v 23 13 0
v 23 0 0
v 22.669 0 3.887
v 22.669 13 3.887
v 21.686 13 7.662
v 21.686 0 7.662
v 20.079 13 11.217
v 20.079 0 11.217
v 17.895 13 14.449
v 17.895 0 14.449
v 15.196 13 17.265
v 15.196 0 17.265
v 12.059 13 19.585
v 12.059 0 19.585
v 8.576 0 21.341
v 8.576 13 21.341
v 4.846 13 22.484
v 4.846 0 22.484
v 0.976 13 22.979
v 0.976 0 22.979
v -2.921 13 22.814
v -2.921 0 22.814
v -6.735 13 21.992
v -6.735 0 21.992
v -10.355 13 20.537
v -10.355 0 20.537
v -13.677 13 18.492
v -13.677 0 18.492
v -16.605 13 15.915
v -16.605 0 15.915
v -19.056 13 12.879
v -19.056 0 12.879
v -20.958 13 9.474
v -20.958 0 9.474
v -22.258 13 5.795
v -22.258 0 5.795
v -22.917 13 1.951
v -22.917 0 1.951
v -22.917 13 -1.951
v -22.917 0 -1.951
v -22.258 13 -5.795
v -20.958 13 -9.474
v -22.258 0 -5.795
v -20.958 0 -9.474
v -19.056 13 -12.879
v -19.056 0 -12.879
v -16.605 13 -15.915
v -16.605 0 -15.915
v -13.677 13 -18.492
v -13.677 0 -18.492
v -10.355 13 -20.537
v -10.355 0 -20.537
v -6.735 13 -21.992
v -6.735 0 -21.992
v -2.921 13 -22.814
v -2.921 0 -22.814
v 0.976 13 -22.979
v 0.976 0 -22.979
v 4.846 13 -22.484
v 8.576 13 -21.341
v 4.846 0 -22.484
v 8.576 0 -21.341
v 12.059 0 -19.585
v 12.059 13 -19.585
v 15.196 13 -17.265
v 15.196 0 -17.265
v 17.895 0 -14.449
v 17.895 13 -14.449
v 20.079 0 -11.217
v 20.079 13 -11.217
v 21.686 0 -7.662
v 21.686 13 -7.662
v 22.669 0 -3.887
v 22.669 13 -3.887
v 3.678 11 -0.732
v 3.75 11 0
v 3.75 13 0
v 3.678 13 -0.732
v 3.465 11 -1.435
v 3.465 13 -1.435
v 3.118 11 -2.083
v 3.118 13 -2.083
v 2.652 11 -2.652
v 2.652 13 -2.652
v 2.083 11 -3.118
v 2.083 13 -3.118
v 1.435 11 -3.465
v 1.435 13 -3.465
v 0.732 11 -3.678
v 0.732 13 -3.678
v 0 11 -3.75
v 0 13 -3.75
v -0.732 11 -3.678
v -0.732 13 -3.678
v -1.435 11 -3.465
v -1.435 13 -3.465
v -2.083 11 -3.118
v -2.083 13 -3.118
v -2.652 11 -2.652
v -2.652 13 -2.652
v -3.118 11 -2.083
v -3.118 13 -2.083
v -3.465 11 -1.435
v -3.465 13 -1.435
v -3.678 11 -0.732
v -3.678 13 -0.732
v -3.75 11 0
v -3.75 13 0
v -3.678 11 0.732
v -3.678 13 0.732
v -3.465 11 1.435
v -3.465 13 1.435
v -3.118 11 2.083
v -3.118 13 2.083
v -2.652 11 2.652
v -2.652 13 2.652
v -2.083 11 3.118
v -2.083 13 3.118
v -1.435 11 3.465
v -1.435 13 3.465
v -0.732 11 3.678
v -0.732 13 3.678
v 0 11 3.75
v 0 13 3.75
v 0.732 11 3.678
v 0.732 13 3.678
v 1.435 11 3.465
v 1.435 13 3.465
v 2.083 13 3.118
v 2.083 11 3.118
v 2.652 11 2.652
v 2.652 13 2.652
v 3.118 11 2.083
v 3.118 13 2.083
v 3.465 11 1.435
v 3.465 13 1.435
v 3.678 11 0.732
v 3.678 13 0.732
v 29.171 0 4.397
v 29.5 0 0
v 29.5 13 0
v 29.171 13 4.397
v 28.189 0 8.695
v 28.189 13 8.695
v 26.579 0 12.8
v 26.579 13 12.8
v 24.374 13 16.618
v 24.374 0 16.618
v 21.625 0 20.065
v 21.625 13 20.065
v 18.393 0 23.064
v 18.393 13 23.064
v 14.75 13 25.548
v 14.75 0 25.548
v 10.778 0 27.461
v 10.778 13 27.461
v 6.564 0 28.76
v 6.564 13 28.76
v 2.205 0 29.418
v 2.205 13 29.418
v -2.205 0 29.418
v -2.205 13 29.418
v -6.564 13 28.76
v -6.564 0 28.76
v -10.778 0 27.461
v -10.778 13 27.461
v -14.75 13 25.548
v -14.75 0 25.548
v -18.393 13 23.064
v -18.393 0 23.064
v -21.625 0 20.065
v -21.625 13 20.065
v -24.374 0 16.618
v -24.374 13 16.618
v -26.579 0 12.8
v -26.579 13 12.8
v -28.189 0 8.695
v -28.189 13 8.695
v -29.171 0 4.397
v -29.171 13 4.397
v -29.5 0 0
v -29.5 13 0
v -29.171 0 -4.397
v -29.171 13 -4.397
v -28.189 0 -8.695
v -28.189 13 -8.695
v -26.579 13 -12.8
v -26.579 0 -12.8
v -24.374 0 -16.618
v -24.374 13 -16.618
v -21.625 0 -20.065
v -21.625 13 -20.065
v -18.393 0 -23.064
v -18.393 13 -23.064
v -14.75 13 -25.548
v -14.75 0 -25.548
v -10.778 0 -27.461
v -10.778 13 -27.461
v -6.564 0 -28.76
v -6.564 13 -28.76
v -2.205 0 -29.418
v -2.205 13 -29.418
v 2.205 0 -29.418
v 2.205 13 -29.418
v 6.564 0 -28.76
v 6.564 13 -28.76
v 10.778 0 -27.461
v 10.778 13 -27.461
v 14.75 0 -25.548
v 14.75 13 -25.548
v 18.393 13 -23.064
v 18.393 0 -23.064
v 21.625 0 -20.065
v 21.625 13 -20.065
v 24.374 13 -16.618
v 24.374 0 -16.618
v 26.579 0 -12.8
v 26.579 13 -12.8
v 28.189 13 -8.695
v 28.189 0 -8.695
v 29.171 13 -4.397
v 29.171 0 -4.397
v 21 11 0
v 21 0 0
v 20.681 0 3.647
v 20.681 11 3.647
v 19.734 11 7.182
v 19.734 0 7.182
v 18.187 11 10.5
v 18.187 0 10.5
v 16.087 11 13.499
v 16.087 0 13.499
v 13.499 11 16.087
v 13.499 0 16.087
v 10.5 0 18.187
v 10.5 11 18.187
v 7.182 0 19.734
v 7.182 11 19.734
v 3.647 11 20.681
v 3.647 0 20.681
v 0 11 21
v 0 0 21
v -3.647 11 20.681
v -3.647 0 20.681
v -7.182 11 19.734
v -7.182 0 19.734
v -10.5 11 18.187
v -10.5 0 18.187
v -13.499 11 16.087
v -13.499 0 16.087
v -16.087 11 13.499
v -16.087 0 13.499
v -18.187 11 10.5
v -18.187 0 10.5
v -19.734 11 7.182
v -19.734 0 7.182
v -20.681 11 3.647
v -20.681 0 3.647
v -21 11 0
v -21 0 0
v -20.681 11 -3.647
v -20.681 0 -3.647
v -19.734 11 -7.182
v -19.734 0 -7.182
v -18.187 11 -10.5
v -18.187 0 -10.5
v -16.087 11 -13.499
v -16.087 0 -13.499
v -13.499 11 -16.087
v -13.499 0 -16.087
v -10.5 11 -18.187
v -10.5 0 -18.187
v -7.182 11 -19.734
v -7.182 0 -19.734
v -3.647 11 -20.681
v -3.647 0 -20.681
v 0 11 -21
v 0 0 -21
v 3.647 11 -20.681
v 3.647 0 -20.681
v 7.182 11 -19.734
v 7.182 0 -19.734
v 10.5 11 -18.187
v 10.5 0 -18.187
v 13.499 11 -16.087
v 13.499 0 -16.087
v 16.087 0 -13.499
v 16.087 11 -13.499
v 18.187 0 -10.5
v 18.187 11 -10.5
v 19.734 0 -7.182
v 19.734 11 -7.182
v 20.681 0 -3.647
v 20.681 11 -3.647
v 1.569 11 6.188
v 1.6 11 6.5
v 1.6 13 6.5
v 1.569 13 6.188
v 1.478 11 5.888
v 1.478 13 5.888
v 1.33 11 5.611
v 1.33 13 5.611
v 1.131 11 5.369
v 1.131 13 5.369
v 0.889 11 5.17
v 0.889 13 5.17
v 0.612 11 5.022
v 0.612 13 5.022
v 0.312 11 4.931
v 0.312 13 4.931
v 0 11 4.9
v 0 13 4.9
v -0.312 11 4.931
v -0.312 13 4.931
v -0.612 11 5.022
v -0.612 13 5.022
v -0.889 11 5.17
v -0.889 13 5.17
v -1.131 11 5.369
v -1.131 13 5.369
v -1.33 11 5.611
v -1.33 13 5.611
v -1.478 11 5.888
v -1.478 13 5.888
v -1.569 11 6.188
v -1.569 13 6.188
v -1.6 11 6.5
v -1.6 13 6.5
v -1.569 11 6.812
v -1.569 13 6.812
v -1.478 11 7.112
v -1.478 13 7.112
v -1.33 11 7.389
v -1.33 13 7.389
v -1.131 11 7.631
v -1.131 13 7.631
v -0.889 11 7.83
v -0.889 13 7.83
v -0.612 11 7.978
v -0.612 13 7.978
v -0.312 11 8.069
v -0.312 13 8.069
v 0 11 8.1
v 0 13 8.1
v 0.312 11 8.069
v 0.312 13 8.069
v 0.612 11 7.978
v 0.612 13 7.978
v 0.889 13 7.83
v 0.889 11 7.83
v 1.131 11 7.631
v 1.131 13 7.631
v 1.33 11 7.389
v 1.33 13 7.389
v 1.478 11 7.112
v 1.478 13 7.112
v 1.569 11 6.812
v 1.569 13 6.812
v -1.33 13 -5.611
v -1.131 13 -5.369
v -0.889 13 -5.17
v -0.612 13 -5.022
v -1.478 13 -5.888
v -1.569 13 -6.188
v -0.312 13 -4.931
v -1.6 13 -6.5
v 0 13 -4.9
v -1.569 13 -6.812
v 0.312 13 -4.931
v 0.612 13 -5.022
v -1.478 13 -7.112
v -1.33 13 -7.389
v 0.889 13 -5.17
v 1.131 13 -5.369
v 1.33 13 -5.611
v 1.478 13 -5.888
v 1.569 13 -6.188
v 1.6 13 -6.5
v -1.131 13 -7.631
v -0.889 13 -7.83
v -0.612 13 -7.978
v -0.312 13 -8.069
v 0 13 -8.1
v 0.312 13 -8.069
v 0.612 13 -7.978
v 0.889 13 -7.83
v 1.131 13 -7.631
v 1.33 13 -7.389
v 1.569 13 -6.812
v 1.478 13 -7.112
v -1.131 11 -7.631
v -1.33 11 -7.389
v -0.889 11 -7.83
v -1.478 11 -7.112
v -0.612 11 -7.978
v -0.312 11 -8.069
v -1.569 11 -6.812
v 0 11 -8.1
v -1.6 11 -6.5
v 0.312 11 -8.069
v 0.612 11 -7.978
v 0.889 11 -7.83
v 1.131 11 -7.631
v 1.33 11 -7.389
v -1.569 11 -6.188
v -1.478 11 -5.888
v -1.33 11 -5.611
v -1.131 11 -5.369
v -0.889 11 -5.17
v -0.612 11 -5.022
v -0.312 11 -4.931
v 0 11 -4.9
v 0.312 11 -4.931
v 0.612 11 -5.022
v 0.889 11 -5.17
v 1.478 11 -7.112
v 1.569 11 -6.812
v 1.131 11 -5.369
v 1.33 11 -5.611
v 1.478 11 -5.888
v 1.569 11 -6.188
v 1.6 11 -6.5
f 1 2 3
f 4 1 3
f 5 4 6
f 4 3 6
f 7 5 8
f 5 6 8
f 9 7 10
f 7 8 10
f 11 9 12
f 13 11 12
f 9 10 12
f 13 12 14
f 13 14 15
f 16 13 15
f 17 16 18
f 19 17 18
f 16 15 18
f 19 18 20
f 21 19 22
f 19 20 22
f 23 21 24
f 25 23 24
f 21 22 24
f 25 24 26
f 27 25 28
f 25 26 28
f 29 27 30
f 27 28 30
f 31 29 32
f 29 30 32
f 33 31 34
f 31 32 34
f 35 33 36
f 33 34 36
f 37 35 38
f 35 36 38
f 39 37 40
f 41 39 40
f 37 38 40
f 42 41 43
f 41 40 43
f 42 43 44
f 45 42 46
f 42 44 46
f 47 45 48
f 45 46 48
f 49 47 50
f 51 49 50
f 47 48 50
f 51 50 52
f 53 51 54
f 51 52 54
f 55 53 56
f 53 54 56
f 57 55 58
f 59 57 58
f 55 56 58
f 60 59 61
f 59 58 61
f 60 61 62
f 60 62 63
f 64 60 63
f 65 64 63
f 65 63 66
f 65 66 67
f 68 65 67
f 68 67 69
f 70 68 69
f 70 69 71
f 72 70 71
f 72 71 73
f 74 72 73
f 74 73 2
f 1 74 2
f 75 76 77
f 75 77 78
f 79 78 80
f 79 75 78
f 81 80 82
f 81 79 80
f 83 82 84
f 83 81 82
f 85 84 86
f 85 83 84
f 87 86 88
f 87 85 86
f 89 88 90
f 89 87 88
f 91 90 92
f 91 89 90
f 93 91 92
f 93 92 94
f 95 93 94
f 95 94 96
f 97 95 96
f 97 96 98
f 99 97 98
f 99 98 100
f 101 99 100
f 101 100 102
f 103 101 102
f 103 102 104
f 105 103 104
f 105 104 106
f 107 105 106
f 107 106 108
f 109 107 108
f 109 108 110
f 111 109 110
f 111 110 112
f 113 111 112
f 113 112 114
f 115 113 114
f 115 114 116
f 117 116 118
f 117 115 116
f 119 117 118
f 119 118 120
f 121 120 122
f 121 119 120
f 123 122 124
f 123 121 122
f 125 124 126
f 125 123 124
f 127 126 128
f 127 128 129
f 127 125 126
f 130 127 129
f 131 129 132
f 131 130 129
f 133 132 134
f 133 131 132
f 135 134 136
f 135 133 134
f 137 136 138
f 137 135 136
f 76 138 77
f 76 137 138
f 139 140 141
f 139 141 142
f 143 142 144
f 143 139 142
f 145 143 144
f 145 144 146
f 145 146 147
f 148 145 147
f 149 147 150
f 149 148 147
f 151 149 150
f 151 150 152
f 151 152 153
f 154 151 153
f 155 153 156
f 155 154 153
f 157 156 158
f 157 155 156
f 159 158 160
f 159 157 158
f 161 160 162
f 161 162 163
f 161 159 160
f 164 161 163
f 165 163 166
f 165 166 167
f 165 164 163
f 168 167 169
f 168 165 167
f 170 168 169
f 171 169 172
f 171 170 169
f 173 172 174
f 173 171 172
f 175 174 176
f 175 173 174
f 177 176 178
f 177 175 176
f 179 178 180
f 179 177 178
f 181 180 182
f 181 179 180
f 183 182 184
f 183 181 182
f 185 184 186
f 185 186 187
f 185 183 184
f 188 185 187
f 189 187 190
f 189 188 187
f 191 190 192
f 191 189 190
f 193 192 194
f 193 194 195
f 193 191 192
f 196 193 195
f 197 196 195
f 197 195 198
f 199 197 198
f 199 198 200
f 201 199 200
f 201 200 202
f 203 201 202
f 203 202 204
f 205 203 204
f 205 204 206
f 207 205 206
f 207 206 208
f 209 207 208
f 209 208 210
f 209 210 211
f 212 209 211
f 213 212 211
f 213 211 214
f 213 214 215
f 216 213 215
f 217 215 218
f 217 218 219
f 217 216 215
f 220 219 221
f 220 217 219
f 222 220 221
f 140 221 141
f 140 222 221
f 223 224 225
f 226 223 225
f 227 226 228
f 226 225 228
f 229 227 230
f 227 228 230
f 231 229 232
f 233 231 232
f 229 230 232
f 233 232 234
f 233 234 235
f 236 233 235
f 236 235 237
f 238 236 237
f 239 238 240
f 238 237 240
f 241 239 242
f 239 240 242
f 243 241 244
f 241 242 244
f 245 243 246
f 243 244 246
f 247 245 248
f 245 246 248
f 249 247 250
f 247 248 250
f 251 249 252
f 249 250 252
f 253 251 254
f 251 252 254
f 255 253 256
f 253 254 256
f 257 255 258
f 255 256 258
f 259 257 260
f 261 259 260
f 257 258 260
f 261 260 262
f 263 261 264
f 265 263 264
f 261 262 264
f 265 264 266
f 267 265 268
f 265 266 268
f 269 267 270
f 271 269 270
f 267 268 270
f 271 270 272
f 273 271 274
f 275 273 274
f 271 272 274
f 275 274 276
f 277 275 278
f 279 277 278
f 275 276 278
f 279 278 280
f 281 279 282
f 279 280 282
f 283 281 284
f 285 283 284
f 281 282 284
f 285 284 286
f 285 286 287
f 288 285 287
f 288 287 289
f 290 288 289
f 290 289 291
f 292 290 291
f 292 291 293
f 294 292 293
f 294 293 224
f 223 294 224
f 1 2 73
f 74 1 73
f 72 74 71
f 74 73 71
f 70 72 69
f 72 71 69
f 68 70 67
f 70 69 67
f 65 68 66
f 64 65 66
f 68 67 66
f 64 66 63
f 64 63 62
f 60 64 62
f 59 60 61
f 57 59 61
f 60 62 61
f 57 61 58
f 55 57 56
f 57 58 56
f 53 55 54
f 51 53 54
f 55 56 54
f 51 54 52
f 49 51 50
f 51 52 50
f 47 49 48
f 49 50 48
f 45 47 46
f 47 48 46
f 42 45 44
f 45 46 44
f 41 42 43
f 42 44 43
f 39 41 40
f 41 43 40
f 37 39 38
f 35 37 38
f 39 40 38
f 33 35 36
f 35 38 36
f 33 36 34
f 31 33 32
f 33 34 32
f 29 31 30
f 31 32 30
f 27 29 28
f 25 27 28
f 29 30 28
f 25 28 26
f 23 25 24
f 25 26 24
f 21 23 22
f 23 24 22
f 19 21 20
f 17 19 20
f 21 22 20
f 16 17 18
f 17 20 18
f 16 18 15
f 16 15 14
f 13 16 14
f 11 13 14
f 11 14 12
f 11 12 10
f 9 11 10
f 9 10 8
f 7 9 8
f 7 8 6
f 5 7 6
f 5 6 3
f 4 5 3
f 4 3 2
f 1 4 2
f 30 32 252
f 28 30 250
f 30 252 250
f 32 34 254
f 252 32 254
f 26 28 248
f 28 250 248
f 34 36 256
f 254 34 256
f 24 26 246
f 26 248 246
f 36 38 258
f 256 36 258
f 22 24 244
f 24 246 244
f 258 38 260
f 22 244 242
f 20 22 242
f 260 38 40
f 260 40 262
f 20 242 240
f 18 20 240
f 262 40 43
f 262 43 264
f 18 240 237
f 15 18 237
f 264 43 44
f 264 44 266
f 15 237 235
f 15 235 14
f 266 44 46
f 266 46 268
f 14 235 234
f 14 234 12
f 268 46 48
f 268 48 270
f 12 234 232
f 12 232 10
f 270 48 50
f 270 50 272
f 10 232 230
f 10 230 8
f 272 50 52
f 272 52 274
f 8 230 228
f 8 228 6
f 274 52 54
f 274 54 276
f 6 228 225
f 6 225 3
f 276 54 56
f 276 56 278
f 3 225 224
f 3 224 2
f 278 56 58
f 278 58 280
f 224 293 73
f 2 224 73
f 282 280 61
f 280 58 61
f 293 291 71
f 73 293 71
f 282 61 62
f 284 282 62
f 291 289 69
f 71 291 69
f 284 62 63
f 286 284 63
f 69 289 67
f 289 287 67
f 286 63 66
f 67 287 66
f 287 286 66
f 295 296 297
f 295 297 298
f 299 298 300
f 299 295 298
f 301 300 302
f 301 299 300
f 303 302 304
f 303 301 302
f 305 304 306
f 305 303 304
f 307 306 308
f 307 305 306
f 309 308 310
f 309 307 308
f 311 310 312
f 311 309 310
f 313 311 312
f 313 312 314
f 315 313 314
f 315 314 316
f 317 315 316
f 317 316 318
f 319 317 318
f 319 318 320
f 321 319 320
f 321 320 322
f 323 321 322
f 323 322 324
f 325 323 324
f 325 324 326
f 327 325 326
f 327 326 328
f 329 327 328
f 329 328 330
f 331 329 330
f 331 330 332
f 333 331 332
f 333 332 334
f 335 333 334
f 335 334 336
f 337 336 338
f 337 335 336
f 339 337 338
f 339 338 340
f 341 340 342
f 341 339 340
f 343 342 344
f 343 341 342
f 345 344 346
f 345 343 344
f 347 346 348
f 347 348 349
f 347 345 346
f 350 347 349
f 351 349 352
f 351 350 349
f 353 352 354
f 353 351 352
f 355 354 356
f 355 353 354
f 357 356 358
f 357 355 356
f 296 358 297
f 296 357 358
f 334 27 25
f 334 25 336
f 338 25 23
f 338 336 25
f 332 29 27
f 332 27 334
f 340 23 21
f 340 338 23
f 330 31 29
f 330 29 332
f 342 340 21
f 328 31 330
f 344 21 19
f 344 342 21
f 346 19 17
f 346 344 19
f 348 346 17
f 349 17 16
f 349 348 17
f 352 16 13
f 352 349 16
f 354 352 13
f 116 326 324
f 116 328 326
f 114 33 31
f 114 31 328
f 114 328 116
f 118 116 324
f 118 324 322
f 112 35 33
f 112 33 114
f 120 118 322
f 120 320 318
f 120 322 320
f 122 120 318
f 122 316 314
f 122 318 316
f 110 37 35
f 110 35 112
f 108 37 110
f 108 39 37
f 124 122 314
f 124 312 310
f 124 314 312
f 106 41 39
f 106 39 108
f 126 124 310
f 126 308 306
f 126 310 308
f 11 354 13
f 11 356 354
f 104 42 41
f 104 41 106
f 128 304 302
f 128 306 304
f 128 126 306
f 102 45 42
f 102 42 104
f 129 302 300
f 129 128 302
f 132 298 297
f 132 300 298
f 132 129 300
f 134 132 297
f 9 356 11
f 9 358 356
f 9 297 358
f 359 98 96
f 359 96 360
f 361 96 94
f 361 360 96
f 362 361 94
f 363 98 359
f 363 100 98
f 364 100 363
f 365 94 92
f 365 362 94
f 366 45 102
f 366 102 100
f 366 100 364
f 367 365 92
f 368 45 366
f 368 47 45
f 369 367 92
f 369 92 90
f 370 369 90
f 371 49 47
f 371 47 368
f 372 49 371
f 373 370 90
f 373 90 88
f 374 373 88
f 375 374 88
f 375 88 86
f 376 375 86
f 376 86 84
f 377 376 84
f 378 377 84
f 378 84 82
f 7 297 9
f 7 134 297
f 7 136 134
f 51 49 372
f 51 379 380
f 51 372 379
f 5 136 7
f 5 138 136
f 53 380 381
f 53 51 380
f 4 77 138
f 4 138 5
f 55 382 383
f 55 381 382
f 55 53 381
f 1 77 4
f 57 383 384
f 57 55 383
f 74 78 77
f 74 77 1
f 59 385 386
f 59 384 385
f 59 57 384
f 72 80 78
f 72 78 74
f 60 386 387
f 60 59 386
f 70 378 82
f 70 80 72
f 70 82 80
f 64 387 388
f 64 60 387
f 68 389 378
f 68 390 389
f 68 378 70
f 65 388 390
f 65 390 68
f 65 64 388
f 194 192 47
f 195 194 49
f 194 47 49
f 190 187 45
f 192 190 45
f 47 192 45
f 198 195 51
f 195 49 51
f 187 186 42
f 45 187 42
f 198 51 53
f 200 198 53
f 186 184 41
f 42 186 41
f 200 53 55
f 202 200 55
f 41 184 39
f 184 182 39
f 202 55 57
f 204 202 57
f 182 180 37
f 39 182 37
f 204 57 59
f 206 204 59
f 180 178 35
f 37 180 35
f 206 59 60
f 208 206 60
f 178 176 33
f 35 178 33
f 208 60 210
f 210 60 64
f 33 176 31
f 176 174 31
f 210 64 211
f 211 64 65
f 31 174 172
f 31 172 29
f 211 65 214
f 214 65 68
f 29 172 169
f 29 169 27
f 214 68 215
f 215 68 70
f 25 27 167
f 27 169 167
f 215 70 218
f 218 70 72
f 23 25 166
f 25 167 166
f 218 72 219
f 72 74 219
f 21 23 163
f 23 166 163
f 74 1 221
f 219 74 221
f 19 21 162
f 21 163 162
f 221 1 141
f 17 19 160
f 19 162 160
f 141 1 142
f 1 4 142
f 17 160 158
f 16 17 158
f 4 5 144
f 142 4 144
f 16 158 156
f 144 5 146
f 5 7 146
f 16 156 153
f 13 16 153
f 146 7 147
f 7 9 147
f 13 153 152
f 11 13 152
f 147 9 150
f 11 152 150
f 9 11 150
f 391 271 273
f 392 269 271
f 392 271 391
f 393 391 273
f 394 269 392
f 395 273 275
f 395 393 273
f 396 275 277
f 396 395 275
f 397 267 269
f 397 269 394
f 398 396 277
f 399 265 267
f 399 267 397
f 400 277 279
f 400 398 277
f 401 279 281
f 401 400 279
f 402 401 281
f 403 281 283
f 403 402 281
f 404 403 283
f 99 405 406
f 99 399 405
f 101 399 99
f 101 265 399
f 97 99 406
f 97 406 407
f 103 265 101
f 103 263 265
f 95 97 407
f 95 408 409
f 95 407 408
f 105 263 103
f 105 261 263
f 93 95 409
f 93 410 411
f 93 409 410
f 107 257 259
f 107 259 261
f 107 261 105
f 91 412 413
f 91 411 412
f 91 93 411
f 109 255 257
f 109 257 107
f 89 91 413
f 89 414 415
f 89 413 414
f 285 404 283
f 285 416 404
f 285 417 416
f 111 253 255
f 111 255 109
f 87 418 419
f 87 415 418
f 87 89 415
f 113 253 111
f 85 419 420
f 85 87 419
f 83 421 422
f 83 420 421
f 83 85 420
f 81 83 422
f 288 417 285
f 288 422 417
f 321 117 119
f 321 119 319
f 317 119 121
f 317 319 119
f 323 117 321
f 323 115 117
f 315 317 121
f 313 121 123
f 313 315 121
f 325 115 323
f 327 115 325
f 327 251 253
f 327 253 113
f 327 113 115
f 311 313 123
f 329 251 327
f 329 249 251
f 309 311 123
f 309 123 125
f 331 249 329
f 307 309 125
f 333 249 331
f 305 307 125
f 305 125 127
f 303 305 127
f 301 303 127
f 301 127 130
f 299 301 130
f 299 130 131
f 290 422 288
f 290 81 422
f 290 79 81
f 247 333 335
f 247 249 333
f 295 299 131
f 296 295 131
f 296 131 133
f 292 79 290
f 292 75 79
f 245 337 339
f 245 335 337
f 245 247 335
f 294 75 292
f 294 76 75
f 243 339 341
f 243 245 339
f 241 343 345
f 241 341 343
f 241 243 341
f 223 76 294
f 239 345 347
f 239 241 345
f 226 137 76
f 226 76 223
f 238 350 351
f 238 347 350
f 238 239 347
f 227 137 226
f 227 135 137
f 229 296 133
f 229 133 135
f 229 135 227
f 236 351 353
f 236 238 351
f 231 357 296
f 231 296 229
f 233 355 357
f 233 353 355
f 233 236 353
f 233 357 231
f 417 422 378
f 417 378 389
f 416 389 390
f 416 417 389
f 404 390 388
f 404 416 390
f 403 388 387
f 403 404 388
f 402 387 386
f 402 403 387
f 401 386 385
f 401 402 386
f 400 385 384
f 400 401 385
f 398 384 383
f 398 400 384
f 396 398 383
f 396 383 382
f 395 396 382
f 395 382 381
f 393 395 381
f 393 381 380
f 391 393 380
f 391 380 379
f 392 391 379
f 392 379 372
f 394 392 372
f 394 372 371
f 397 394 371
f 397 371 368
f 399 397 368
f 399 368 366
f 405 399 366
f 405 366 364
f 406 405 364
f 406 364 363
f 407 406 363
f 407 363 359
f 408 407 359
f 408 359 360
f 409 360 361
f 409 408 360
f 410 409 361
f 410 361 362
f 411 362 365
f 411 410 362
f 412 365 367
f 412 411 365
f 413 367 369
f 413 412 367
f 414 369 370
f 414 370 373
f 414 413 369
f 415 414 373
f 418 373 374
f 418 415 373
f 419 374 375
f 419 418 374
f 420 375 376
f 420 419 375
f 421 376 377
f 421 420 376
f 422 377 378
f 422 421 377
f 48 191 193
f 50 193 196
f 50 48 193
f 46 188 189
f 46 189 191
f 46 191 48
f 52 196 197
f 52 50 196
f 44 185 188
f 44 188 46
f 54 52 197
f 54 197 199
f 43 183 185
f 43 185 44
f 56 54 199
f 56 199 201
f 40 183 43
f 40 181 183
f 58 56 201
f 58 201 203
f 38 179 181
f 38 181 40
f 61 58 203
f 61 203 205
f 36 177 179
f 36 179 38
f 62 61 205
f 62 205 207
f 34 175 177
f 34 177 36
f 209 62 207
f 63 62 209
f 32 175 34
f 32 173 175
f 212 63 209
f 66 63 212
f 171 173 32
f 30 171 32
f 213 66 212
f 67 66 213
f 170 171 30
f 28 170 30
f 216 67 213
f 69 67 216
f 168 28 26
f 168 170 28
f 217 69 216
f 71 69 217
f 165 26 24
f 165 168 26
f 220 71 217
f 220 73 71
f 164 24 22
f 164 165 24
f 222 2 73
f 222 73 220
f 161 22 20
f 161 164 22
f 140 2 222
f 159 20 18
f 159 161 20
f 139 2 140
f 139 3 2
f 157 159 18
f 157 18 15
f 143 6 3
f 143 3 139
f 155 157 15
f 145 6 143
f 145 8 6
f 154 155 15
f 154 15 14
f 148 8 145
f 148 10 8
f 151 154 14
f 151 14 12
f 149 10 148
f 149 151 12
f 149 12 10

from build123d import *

# Parameters (mm, degrees)
SKETCH_1_R          = 23
SKETCH_1_R_2        = 1.6
SKETCH_1_R_3        = 3.75
EXTRUDE_1_DEPTH     = 13
SKETCH_3_R          = 21
CUT_EXTRUDE_1_DEPTH = 11
SKETCH_4_R          = 29.5
SKETCH_4_R_2        = 23
EXTRUDE_2_DEPTH     = 13


with BuildPart() as part:
    # 草图1 → 凸台-拉伸1 (new body)
    with BuildSketch(Plane(origin=(0, 0, 0), x_dir=(1, 0, 0), z_dir=(0, 1, 0))):
        Circle(SKETCH_1_R)
        with Locations((0, 6.5)):
            Circle(SKETCH_1_R_2, mode=Mode.SUBTRACT)
        with Locations((0, -6.5)):
            Circle(SKETCH_1_R_2, mode=Mode.SUBTRACT)
        Circle(SKETCH_1_R_3, mode=Mode.SUBTRACT)
    extrude(amount=EXTRUDE_1_DEPTH)

    # 草图3 → 切除-拉伸1 (cut)
    with BuildSketch(Plane.XZ):
        Circle(SKETCH_3_R)
    extrude(amount=-CUT_EXTRUDE_1_DEPTH, mode=Mode.SUBTRACT)


with BuildPart() as body_2:
    # 草图4 → 凸台-拉伸2 (new body)
    with BuildSketch(Plane.XZ):
        Circle(SKETCH_4_R)
        Circle(SKETCH_4_R_2, mode=Mode.SUBTRACT)
    extrude(amount=-EXTRUDE_2_DEPTH)


solid = Compound([part.part, body_2.part])
